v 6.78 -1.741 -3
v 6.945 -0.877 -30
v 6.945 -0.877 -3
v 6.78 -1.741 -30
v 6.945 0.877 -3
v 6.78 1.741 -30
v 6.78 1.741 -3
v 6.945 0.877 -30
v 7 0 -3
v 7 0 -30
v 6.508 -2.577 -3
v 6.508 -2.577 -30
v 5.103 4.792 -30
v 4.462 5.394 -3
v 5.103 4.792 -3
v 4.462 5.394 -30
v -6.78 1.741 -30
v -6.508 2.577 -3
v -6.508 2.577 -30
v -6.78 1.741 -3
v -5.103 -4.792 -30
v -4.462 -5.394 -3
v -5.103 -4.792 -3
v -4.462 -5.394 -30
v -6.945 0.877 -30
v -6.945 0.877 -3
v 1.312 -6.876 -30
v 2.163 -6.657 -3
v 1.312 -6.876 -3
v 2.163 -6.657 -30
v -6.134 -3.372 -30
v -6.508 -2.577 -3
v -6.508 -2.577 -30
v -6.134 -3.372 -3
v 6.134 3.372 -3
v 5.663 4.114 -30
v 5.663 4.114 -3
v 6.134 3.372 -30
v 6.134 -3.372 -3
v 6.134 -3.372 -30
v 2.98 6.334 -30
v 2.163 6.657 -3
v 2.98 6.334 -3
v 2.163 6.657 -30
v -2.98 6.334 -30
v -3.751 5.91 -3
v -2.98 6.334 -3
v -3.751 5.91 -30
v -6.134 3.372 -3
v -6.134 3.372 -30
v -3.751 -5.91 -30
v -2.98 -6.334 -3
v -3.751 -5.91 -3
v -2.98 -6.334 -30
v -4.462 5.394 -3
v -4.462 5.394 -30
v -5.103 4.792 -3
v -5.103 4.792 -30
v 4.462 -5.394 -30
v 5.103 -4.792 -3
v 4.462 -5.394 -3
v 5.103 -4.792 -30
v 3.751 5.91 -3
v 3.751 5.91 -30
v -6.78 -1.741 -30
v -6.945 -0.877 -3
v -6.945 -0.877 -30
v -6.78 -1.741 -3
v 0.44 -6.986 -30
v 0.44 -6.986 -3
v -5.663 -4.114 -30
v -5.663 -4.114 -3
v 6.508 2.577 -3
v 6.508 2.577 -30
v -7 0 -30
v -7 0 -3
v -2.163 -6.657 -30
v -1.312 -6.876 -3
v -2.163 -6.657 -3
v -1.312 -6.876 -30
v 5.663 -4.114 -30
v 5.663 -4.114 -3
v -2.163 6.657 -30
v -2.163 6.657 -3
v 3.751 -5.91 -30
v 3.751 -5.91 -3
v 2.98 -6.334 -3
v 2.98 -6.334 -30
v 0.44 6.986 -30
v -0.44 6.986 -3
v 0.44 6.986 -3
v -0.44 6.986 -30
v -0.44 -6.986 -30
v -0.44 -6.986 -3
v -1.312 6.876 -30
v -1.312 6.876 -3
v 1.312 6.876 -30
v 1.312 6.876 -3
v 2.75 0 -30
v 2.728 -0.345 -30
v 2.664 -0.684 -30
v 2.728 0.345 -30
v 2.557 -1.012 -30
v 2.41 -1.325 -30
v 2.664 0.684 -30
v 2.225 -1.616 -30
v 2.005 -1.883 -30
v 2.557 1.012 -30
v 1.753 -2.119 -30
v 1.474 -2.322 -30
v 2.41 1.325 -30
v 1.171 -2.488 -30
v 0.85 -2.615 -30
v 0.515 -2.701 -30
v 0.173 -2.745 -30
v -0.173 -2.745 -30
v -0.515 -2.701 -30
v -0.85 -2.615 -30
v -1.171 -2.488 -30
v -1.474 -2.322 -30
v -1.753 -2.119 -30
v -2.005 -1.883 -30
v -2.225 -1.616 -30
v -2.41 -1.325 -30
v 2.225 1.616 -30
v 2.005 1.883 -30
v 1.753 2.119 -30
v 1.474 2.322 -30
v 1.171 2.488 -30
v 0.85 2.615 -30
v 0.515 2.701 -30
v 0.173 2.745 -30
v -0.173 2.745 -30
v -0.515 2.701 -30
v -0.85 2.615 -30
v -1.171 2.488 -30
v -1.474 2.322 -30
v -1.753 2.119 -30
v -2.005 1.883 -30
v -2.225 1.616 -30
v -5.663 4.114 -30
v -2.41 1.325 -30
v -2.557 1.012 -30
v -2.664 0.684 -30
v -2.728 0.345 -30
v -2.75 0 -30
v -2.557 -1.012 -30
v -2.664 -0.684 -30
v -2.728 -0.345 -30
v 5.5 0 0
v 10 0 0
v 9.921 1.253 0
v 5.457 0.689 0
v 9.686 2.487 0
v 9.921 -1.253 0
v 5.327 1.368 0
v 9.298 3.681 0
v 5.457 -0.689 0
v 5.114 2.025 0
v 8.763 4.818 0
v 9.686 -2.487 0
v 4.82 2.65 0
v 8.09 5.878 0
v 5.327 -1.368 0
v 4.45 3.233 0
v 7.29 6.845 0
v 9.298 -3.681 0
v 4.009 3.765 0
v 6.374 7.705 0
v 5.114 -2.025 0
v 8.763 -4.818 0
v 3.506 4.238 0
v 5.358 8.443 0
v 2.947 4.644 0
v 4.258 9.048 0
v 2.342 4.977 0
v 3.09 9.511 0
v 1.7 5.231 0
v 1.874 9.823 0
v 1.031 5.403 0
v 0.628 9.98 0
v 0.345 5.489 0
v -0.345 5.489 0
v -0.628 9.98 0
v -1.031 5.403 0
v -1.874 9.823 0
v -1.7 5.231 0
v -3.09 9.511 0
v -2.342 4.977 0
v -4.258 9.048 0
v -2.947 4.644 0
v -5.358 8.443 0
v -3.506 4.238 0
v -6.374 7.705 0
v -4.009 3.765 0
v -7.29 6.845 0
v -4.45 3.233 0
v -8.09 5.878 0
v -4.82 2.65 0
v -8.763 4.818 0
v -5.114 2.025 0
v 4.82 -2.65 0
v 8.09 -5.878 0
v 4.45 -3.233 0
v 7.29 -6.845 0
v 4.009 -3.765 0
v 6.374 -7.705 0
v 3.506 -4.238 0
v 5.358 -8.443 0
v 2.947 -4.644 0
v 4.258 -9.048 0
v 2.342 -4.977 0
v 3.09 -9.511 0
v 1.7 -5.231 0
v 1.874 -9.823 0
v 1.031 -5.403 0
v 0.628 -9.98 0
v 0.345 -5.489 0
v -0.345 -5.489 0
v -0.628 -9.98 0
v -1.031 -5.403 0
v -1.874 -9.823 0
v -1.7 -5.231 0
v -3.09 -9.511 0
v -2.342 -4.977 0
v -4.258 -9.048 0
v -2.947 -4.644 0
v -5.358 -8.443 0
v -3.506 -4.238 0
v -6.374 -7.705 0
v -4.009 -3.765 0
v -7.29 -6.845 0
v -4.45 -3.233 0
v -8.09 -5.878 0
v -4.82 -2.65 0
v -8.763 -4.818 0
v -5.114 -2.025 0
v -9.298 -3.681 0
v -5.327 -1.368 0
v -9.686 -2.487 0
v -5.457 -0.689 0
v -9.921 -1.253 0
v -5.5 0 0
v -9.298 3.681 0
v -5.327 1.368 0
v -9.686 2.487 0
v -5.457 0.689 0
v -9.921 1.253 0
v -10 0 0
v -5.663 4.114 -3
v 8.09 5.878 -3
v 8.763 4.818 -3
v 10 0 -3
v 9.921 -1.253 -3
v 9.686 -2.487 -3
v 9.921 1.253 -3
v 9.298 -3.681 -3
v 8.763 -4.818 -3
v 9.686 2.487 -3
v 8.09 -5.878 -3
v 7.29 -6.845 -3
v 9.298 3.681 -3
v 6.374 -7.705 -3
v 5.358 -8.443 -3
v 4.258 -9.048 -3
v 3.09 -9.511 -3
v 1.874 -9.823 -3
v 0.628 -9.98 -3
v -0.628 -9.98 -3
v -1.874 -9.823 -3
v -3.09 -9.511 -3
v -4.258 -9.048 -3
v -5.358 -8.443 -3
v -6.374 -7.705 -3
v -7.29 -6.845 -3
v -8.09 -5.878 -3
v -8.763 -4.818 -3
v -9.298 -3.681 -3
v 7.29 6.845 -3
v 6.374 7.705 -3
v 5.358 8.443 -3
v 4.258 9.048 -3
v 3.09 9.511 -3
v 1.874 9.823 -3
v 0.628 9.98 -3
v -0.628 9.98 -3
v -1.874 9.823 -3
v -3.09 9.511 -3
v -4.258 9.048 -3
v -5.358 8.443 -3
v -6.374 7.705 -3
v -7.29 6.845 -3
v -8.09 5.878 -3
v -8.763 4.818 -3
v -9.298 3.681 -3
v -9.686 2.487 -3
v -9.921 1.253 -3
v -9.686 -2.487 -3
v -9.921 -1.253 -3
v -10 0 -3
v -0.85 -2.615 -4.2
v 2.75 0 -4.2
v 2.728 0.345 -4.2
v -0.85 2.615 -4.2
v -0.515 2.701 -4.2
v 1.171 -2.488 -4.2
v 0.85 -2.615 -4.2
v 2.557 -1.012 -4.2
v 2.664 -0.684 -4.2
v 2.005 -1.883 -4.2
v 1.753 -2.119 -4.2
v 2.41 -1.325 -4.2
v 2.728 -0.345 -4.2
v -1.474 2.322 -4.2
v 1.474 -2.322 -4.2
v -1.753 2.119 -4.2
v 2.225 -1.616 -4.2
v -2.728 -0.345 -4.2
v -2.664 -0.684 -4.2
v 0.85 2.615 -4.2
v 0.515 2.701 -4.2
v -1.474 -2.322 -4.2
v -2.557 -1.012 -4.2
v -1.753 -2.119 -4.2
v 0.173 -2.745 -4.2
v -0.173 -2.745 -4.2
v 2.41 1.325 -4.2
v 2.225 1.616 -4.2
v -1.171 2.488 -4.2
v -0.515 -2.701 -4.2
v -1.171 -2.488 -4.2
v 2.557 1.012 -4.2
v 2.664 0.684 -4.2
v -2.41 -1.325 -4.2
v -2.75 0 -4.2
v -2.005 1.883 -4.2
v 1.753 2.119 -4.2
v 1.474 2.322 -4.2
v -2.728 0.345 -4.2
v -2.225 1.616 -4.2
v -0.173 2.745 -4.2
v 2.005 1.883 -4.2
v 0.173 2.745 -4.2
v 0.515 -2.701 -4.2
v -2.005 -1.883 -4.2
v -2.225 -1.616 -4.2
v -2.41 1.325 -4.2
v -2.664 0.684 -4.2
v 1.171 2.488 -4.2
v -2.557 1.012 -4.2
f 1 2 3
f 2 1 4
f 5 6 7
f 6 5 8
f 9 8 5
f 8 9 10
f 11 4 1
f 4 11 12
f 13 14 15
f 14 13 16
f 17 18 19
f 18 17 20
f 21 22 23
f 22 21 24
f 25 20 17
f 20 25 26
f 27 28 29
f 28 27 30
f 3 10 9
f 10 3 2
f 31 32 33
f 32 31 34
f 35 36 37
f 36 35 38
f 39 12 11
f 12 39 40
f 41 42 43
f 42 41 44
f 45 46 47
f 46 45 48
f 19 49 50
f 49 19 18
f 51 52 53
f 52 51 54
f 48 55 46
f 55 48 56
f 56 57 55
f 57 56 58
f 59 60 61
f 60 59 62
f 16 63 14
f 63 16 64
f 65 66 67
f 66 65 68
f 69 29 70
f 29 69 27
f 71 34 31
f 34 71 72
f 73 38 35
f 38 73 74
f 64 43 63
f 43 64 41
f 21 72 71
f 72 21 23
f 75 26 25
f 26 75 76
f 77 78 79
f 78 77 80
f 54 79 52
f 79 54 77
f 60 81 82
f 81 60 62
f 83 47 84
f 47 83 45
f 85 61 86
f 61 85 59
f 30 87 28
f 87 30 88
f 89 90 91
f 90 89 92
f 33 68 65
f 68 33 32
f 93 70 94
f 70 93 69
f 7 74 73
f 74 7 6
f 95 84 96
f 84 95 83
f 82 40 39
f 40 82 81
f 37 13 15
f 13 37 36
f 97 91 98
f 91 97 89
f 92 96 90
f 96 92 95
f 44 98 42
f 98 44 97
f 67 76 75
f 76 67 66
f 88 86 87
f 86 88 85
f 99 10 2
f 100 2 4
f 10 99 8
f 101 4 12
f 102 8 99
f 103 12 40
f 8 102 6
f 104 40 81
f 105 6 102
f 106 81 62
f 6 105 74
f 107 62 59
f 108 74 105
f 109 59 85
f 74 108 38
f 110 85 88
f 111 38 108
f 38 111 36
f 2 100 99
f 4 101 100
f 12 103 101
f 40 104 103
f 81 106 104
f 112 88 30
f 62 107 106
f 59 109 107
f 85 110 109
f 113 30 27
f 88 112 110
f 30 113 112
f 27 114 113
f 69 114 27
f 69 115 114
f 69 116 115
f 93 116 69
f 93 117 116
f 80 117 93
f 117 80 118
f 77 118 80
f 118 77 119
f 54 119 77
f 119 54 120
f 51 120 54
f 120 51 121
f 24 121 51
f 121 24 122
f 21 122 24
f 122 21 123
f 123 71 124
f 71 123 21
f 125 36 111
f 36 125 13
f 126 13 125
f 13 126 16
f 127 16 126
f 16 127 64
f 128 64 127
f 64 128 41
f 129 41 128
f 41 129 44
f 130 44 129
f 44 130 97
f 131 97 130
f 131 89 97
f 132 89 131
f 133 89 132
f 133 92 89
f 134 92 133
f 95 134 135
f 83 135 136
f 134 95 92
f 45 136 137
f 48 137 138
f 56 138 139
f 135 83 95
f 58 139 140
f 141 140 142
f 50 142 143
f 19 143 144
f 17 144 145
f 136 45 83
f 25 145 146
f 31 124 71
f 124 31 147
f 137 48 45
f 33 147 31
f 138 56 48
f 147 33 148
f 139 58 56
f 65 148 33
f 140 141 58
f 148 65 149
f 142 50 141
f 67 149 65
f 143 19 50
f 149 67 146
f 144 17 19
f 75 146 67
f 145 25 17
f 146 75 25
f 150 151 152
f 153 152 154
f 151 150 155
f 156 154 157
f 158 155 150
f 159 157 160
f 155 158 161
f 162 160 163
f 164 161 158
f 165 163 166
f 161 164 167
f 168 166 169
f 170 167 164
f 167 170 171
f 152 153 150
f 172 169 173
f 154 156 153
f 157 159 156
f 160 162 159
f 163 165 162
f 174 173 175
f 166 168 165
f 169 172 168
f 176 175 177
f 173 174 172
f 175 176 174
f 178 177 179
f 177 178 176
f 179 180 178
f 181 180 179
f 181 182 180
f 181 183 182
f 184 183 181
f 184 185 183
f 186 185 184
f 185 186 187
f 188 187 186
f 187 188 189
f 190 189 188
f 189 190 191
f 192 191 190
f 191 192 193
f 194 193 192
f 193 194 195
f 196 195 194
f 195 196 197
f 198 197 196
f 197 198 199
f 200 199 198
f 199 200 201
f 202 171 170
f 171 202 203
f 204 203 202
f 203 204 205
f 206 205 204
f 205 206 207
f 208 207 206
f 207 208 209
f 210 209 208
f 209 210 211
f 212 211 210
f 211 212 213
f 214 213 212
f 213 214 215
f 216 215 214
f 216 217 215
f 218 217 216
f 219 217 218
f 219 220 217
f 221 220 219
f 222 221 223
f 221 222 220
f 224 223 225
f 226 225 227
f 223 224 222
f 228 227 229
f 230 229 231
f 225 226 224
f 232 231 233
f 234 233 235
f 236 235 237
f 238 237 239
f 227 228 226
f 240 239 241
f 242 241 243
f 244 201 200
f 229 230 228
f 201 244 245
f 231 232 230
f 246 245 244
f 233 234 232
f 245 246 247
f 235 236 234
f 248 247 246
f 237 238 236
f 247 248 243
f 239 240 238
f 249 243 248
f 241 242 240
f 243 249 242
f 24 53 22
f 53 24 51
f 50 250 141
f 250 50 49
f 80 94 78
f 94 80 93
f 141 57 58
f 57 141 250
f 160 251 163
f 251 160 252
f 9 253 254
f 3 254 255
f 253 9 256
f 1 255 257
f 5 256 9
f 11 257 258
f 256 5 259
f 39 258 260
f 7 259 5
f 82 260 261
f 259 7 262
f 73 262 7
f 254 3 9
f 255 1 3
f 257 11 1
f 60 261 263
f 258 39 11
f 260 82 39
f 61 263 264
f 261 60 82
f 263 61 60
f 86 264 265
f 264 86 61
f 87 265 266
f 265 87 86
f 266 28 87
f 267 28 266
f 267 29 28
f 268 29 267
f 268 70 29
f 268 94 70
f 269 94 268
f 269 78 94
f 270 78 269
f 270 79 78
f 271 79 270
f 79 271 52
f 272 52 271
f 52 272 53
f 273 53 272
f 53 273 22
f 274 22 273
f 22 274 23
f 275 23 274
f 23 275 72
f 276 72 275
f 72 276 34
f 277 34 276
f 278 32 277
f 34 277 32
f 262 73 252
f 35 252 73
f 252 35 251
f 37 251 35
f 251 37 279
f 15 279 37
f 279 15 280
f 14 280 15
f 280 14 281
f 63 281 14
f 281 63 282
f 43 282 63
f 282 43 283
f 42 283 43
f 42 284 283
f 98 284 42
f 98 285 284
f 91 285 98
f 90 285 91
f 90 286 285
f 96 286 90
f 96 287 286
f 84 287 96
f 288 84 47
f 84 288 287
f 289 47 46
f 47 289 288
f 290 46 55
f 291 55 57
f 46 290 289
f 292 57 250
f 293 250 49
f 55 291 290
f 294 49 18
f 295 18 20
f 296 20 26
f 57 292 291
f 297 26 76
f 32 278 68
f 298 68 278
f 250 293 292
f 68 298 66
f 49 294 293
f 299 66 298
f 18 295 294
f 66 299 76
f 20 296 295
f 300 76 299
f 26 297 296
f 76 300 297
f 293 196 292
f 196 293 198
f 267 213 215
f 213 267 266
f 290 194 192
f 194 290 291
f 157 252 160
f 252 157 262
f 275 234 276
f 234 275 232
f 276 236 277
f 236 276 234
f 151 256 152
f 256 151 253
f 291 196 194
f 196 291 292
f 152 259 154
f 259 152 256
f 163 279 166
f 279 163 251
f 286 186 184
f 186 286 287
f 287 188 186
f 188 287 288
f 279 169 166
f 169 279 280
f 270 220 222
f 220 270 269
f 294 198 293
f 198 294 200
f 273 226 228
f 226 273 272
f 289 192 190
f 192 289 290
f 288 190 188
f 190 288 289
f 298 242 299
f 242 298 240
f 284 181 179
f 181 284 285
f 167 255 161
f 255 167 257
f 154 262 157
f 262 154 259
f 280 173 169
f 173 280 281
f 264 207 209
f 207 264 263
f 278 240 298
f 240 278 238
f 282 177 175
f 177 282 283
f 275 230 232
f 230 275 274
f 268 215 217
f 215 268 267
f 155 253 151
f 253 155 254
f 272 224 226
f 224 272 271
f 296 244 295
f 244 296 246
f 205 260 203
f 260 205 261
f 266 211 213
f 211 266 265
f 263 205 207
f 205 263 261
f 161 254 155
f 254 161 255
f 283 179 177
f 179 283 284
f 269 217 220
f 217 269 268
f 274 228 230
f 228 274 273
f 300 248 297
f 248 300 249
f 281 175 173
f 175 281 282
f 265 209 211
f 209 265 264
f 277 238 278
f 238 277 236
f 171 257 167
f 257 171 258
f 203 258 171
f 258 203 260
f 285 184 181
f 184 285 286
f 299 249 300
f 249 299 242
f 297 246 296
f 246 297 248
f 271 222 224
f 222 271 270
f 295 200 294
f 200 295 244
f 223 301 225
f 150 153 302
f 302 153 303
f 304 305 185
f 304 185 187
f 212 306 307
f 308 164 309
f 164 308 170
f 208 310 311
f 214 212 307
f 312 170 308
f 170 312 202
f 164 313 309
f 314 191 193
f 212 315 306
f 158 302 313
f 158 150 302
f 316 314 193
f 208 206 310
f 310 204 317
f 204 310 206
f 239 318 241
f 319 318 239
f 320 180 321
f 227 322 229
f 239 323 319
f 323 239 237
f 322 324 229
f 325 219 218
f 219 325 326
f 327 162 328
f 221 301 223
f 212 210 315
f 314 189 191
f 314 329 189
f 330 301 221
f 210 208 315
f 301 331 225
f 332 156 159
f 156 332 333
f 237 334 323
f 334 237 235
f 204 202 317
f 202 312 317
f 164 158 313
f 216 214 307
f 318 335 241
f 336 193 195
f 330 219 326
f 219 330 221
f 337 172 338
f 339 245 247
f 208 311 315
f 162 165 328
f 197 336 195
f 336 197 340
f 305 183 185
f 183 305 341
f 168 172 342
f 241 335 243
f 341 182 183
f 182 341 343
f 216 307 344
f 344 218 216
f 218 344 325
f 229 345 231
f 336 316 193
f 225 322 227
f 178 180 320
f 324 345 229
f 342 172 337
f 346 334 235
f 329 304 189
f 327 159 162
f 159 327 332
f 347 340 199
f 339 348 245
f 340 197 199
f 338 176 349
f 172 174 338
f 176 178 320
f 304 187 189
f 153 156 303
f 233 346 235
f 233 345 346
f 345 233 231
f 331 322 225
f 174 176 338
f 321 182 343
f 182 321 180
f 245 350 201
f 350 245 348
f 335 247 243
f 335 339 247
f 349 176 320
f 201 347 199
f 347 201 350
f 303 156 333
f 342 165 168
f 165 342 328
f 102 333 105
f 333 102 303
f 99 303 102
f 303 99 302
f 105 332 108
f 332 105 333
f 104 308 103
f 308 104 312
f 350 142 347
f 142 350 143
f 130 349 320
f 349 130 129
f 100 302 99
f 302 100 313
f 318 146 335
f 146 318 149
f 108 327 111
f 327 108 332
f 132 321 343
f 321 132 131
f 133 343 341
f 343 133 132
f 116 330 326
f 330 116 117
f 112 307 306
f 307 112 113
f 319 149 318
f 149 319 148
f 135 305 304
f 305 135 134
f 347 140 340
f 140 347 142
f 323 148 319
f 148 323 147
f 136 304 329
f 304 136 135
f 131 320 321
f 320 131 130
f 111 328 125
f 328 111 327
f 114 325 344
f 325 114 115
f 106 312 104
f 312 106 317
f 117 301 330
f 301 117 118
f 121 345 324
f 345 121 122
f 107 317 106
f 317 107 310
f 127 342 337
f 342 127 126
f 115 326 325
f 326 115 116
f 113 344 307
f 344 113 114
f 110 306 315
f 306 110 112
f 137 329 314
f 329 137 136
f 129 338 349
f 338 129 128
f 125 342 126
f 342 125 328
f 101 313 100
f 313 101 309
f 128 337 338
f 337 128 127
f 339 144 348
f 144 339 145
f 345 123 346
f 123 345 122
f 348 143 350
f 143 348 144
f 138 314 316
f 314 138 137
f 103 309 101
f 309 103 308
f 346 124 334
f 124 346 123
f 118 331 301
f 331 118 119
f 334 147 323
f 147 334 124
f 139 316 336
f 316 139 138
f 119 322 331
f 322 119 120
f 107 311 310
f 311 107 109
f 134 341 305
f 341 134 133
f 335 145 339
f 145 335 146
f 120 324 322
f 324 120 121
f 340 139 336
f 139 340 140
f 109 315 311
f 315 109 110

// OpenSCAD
$fn = 50;


difference() {
	union() {
		translate(v = [0, 0, -30.0000000000]) {
			cylinder(h = 30, r = 7.0000000000);
		}
		translate(v = [0, 0, -3.0000000000]) {
			cylinder(h = 3, r = 10.0000000000);
		}
	}
	union() {
		translate(v = [0, 0, 0]) {
			rotate(a = [0, 0, 0]) {
				difference() {
					union() {
						#translate(v = [0, 0, -30.0000000000]) {
							cylinder(h = 30, r = 2.2500000000);
						}
						#translate(v = [0, 0, -4.2000000000]) {
							cylinder(h = 4.2000000000, r = 7.0000000000, r1 = 2.7500000000, r2 = 5.5000000000);
						}
						#translate(v = [0, 0, -30.0000000000]) {
							cylinder(h = 30, r = 2.7500000000);
						}
						#translate(v = [0, 0, -30.0000000000]) {
							cylinder(h = 30, r = 2.2500000000);
						}
					}
					union();
				}
			}
		}
	}
}
